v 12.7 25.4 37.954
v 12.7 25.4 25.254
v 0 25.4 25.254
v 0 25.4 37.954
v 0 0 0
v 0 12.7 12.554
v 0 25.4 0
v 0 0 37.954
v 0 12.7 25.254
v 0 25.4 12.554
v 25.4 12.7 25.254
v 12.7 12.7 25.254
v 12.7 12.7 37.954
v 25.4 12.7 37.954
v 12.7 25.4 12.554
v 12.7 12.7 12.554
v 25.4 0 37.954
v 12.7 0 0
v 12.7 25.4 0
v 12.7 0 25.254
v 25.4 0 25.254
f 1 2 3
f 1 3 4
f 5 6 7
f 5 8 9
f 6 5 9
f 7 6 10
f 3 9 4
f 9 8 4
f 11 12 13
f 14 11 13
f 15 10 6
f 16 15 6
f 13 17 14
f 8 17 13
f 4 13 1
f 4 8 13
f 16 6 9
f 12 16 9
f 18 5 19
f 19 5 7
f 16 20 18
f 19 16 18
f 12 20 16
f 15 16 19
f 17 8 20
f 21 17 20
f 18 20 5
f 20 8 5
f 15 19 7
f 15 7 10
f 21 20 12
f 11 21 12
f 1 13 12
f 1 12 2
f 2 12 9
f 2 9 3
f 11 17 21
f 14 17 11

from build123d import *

# Parameters (mm, degrees)
F0_W     = 12.7
F0_H     = 12.7
F1_DEPTH = 25.4
F2_DEPTH = 12.7


with BuildPart() as f1:
    # F0 (on Right) → F1 (new body)
    with BuildSketch(Plane.YZ):
        with Locations((6.35, 31.6040249003)):
            Rectangle(F0_W, F0_H)
    extrude(amount=F1_DEPTH)

    # F0 (on Right) → F2 (join)
    with BuildSketch(Plane.YZ):
        Polygon((0, 25.2540249003), (0, 0), (25.4, 0), (25.4, 12.5540249003), (12.7, 12.5540249003), (12.7, 25.2540249003), align=None)
        with Locations((19.05, 31.6040249003)):
            Rectangle(F0_W, F0_H)
    extrude(amount=F2_DEPTH)


solid = f1.part
